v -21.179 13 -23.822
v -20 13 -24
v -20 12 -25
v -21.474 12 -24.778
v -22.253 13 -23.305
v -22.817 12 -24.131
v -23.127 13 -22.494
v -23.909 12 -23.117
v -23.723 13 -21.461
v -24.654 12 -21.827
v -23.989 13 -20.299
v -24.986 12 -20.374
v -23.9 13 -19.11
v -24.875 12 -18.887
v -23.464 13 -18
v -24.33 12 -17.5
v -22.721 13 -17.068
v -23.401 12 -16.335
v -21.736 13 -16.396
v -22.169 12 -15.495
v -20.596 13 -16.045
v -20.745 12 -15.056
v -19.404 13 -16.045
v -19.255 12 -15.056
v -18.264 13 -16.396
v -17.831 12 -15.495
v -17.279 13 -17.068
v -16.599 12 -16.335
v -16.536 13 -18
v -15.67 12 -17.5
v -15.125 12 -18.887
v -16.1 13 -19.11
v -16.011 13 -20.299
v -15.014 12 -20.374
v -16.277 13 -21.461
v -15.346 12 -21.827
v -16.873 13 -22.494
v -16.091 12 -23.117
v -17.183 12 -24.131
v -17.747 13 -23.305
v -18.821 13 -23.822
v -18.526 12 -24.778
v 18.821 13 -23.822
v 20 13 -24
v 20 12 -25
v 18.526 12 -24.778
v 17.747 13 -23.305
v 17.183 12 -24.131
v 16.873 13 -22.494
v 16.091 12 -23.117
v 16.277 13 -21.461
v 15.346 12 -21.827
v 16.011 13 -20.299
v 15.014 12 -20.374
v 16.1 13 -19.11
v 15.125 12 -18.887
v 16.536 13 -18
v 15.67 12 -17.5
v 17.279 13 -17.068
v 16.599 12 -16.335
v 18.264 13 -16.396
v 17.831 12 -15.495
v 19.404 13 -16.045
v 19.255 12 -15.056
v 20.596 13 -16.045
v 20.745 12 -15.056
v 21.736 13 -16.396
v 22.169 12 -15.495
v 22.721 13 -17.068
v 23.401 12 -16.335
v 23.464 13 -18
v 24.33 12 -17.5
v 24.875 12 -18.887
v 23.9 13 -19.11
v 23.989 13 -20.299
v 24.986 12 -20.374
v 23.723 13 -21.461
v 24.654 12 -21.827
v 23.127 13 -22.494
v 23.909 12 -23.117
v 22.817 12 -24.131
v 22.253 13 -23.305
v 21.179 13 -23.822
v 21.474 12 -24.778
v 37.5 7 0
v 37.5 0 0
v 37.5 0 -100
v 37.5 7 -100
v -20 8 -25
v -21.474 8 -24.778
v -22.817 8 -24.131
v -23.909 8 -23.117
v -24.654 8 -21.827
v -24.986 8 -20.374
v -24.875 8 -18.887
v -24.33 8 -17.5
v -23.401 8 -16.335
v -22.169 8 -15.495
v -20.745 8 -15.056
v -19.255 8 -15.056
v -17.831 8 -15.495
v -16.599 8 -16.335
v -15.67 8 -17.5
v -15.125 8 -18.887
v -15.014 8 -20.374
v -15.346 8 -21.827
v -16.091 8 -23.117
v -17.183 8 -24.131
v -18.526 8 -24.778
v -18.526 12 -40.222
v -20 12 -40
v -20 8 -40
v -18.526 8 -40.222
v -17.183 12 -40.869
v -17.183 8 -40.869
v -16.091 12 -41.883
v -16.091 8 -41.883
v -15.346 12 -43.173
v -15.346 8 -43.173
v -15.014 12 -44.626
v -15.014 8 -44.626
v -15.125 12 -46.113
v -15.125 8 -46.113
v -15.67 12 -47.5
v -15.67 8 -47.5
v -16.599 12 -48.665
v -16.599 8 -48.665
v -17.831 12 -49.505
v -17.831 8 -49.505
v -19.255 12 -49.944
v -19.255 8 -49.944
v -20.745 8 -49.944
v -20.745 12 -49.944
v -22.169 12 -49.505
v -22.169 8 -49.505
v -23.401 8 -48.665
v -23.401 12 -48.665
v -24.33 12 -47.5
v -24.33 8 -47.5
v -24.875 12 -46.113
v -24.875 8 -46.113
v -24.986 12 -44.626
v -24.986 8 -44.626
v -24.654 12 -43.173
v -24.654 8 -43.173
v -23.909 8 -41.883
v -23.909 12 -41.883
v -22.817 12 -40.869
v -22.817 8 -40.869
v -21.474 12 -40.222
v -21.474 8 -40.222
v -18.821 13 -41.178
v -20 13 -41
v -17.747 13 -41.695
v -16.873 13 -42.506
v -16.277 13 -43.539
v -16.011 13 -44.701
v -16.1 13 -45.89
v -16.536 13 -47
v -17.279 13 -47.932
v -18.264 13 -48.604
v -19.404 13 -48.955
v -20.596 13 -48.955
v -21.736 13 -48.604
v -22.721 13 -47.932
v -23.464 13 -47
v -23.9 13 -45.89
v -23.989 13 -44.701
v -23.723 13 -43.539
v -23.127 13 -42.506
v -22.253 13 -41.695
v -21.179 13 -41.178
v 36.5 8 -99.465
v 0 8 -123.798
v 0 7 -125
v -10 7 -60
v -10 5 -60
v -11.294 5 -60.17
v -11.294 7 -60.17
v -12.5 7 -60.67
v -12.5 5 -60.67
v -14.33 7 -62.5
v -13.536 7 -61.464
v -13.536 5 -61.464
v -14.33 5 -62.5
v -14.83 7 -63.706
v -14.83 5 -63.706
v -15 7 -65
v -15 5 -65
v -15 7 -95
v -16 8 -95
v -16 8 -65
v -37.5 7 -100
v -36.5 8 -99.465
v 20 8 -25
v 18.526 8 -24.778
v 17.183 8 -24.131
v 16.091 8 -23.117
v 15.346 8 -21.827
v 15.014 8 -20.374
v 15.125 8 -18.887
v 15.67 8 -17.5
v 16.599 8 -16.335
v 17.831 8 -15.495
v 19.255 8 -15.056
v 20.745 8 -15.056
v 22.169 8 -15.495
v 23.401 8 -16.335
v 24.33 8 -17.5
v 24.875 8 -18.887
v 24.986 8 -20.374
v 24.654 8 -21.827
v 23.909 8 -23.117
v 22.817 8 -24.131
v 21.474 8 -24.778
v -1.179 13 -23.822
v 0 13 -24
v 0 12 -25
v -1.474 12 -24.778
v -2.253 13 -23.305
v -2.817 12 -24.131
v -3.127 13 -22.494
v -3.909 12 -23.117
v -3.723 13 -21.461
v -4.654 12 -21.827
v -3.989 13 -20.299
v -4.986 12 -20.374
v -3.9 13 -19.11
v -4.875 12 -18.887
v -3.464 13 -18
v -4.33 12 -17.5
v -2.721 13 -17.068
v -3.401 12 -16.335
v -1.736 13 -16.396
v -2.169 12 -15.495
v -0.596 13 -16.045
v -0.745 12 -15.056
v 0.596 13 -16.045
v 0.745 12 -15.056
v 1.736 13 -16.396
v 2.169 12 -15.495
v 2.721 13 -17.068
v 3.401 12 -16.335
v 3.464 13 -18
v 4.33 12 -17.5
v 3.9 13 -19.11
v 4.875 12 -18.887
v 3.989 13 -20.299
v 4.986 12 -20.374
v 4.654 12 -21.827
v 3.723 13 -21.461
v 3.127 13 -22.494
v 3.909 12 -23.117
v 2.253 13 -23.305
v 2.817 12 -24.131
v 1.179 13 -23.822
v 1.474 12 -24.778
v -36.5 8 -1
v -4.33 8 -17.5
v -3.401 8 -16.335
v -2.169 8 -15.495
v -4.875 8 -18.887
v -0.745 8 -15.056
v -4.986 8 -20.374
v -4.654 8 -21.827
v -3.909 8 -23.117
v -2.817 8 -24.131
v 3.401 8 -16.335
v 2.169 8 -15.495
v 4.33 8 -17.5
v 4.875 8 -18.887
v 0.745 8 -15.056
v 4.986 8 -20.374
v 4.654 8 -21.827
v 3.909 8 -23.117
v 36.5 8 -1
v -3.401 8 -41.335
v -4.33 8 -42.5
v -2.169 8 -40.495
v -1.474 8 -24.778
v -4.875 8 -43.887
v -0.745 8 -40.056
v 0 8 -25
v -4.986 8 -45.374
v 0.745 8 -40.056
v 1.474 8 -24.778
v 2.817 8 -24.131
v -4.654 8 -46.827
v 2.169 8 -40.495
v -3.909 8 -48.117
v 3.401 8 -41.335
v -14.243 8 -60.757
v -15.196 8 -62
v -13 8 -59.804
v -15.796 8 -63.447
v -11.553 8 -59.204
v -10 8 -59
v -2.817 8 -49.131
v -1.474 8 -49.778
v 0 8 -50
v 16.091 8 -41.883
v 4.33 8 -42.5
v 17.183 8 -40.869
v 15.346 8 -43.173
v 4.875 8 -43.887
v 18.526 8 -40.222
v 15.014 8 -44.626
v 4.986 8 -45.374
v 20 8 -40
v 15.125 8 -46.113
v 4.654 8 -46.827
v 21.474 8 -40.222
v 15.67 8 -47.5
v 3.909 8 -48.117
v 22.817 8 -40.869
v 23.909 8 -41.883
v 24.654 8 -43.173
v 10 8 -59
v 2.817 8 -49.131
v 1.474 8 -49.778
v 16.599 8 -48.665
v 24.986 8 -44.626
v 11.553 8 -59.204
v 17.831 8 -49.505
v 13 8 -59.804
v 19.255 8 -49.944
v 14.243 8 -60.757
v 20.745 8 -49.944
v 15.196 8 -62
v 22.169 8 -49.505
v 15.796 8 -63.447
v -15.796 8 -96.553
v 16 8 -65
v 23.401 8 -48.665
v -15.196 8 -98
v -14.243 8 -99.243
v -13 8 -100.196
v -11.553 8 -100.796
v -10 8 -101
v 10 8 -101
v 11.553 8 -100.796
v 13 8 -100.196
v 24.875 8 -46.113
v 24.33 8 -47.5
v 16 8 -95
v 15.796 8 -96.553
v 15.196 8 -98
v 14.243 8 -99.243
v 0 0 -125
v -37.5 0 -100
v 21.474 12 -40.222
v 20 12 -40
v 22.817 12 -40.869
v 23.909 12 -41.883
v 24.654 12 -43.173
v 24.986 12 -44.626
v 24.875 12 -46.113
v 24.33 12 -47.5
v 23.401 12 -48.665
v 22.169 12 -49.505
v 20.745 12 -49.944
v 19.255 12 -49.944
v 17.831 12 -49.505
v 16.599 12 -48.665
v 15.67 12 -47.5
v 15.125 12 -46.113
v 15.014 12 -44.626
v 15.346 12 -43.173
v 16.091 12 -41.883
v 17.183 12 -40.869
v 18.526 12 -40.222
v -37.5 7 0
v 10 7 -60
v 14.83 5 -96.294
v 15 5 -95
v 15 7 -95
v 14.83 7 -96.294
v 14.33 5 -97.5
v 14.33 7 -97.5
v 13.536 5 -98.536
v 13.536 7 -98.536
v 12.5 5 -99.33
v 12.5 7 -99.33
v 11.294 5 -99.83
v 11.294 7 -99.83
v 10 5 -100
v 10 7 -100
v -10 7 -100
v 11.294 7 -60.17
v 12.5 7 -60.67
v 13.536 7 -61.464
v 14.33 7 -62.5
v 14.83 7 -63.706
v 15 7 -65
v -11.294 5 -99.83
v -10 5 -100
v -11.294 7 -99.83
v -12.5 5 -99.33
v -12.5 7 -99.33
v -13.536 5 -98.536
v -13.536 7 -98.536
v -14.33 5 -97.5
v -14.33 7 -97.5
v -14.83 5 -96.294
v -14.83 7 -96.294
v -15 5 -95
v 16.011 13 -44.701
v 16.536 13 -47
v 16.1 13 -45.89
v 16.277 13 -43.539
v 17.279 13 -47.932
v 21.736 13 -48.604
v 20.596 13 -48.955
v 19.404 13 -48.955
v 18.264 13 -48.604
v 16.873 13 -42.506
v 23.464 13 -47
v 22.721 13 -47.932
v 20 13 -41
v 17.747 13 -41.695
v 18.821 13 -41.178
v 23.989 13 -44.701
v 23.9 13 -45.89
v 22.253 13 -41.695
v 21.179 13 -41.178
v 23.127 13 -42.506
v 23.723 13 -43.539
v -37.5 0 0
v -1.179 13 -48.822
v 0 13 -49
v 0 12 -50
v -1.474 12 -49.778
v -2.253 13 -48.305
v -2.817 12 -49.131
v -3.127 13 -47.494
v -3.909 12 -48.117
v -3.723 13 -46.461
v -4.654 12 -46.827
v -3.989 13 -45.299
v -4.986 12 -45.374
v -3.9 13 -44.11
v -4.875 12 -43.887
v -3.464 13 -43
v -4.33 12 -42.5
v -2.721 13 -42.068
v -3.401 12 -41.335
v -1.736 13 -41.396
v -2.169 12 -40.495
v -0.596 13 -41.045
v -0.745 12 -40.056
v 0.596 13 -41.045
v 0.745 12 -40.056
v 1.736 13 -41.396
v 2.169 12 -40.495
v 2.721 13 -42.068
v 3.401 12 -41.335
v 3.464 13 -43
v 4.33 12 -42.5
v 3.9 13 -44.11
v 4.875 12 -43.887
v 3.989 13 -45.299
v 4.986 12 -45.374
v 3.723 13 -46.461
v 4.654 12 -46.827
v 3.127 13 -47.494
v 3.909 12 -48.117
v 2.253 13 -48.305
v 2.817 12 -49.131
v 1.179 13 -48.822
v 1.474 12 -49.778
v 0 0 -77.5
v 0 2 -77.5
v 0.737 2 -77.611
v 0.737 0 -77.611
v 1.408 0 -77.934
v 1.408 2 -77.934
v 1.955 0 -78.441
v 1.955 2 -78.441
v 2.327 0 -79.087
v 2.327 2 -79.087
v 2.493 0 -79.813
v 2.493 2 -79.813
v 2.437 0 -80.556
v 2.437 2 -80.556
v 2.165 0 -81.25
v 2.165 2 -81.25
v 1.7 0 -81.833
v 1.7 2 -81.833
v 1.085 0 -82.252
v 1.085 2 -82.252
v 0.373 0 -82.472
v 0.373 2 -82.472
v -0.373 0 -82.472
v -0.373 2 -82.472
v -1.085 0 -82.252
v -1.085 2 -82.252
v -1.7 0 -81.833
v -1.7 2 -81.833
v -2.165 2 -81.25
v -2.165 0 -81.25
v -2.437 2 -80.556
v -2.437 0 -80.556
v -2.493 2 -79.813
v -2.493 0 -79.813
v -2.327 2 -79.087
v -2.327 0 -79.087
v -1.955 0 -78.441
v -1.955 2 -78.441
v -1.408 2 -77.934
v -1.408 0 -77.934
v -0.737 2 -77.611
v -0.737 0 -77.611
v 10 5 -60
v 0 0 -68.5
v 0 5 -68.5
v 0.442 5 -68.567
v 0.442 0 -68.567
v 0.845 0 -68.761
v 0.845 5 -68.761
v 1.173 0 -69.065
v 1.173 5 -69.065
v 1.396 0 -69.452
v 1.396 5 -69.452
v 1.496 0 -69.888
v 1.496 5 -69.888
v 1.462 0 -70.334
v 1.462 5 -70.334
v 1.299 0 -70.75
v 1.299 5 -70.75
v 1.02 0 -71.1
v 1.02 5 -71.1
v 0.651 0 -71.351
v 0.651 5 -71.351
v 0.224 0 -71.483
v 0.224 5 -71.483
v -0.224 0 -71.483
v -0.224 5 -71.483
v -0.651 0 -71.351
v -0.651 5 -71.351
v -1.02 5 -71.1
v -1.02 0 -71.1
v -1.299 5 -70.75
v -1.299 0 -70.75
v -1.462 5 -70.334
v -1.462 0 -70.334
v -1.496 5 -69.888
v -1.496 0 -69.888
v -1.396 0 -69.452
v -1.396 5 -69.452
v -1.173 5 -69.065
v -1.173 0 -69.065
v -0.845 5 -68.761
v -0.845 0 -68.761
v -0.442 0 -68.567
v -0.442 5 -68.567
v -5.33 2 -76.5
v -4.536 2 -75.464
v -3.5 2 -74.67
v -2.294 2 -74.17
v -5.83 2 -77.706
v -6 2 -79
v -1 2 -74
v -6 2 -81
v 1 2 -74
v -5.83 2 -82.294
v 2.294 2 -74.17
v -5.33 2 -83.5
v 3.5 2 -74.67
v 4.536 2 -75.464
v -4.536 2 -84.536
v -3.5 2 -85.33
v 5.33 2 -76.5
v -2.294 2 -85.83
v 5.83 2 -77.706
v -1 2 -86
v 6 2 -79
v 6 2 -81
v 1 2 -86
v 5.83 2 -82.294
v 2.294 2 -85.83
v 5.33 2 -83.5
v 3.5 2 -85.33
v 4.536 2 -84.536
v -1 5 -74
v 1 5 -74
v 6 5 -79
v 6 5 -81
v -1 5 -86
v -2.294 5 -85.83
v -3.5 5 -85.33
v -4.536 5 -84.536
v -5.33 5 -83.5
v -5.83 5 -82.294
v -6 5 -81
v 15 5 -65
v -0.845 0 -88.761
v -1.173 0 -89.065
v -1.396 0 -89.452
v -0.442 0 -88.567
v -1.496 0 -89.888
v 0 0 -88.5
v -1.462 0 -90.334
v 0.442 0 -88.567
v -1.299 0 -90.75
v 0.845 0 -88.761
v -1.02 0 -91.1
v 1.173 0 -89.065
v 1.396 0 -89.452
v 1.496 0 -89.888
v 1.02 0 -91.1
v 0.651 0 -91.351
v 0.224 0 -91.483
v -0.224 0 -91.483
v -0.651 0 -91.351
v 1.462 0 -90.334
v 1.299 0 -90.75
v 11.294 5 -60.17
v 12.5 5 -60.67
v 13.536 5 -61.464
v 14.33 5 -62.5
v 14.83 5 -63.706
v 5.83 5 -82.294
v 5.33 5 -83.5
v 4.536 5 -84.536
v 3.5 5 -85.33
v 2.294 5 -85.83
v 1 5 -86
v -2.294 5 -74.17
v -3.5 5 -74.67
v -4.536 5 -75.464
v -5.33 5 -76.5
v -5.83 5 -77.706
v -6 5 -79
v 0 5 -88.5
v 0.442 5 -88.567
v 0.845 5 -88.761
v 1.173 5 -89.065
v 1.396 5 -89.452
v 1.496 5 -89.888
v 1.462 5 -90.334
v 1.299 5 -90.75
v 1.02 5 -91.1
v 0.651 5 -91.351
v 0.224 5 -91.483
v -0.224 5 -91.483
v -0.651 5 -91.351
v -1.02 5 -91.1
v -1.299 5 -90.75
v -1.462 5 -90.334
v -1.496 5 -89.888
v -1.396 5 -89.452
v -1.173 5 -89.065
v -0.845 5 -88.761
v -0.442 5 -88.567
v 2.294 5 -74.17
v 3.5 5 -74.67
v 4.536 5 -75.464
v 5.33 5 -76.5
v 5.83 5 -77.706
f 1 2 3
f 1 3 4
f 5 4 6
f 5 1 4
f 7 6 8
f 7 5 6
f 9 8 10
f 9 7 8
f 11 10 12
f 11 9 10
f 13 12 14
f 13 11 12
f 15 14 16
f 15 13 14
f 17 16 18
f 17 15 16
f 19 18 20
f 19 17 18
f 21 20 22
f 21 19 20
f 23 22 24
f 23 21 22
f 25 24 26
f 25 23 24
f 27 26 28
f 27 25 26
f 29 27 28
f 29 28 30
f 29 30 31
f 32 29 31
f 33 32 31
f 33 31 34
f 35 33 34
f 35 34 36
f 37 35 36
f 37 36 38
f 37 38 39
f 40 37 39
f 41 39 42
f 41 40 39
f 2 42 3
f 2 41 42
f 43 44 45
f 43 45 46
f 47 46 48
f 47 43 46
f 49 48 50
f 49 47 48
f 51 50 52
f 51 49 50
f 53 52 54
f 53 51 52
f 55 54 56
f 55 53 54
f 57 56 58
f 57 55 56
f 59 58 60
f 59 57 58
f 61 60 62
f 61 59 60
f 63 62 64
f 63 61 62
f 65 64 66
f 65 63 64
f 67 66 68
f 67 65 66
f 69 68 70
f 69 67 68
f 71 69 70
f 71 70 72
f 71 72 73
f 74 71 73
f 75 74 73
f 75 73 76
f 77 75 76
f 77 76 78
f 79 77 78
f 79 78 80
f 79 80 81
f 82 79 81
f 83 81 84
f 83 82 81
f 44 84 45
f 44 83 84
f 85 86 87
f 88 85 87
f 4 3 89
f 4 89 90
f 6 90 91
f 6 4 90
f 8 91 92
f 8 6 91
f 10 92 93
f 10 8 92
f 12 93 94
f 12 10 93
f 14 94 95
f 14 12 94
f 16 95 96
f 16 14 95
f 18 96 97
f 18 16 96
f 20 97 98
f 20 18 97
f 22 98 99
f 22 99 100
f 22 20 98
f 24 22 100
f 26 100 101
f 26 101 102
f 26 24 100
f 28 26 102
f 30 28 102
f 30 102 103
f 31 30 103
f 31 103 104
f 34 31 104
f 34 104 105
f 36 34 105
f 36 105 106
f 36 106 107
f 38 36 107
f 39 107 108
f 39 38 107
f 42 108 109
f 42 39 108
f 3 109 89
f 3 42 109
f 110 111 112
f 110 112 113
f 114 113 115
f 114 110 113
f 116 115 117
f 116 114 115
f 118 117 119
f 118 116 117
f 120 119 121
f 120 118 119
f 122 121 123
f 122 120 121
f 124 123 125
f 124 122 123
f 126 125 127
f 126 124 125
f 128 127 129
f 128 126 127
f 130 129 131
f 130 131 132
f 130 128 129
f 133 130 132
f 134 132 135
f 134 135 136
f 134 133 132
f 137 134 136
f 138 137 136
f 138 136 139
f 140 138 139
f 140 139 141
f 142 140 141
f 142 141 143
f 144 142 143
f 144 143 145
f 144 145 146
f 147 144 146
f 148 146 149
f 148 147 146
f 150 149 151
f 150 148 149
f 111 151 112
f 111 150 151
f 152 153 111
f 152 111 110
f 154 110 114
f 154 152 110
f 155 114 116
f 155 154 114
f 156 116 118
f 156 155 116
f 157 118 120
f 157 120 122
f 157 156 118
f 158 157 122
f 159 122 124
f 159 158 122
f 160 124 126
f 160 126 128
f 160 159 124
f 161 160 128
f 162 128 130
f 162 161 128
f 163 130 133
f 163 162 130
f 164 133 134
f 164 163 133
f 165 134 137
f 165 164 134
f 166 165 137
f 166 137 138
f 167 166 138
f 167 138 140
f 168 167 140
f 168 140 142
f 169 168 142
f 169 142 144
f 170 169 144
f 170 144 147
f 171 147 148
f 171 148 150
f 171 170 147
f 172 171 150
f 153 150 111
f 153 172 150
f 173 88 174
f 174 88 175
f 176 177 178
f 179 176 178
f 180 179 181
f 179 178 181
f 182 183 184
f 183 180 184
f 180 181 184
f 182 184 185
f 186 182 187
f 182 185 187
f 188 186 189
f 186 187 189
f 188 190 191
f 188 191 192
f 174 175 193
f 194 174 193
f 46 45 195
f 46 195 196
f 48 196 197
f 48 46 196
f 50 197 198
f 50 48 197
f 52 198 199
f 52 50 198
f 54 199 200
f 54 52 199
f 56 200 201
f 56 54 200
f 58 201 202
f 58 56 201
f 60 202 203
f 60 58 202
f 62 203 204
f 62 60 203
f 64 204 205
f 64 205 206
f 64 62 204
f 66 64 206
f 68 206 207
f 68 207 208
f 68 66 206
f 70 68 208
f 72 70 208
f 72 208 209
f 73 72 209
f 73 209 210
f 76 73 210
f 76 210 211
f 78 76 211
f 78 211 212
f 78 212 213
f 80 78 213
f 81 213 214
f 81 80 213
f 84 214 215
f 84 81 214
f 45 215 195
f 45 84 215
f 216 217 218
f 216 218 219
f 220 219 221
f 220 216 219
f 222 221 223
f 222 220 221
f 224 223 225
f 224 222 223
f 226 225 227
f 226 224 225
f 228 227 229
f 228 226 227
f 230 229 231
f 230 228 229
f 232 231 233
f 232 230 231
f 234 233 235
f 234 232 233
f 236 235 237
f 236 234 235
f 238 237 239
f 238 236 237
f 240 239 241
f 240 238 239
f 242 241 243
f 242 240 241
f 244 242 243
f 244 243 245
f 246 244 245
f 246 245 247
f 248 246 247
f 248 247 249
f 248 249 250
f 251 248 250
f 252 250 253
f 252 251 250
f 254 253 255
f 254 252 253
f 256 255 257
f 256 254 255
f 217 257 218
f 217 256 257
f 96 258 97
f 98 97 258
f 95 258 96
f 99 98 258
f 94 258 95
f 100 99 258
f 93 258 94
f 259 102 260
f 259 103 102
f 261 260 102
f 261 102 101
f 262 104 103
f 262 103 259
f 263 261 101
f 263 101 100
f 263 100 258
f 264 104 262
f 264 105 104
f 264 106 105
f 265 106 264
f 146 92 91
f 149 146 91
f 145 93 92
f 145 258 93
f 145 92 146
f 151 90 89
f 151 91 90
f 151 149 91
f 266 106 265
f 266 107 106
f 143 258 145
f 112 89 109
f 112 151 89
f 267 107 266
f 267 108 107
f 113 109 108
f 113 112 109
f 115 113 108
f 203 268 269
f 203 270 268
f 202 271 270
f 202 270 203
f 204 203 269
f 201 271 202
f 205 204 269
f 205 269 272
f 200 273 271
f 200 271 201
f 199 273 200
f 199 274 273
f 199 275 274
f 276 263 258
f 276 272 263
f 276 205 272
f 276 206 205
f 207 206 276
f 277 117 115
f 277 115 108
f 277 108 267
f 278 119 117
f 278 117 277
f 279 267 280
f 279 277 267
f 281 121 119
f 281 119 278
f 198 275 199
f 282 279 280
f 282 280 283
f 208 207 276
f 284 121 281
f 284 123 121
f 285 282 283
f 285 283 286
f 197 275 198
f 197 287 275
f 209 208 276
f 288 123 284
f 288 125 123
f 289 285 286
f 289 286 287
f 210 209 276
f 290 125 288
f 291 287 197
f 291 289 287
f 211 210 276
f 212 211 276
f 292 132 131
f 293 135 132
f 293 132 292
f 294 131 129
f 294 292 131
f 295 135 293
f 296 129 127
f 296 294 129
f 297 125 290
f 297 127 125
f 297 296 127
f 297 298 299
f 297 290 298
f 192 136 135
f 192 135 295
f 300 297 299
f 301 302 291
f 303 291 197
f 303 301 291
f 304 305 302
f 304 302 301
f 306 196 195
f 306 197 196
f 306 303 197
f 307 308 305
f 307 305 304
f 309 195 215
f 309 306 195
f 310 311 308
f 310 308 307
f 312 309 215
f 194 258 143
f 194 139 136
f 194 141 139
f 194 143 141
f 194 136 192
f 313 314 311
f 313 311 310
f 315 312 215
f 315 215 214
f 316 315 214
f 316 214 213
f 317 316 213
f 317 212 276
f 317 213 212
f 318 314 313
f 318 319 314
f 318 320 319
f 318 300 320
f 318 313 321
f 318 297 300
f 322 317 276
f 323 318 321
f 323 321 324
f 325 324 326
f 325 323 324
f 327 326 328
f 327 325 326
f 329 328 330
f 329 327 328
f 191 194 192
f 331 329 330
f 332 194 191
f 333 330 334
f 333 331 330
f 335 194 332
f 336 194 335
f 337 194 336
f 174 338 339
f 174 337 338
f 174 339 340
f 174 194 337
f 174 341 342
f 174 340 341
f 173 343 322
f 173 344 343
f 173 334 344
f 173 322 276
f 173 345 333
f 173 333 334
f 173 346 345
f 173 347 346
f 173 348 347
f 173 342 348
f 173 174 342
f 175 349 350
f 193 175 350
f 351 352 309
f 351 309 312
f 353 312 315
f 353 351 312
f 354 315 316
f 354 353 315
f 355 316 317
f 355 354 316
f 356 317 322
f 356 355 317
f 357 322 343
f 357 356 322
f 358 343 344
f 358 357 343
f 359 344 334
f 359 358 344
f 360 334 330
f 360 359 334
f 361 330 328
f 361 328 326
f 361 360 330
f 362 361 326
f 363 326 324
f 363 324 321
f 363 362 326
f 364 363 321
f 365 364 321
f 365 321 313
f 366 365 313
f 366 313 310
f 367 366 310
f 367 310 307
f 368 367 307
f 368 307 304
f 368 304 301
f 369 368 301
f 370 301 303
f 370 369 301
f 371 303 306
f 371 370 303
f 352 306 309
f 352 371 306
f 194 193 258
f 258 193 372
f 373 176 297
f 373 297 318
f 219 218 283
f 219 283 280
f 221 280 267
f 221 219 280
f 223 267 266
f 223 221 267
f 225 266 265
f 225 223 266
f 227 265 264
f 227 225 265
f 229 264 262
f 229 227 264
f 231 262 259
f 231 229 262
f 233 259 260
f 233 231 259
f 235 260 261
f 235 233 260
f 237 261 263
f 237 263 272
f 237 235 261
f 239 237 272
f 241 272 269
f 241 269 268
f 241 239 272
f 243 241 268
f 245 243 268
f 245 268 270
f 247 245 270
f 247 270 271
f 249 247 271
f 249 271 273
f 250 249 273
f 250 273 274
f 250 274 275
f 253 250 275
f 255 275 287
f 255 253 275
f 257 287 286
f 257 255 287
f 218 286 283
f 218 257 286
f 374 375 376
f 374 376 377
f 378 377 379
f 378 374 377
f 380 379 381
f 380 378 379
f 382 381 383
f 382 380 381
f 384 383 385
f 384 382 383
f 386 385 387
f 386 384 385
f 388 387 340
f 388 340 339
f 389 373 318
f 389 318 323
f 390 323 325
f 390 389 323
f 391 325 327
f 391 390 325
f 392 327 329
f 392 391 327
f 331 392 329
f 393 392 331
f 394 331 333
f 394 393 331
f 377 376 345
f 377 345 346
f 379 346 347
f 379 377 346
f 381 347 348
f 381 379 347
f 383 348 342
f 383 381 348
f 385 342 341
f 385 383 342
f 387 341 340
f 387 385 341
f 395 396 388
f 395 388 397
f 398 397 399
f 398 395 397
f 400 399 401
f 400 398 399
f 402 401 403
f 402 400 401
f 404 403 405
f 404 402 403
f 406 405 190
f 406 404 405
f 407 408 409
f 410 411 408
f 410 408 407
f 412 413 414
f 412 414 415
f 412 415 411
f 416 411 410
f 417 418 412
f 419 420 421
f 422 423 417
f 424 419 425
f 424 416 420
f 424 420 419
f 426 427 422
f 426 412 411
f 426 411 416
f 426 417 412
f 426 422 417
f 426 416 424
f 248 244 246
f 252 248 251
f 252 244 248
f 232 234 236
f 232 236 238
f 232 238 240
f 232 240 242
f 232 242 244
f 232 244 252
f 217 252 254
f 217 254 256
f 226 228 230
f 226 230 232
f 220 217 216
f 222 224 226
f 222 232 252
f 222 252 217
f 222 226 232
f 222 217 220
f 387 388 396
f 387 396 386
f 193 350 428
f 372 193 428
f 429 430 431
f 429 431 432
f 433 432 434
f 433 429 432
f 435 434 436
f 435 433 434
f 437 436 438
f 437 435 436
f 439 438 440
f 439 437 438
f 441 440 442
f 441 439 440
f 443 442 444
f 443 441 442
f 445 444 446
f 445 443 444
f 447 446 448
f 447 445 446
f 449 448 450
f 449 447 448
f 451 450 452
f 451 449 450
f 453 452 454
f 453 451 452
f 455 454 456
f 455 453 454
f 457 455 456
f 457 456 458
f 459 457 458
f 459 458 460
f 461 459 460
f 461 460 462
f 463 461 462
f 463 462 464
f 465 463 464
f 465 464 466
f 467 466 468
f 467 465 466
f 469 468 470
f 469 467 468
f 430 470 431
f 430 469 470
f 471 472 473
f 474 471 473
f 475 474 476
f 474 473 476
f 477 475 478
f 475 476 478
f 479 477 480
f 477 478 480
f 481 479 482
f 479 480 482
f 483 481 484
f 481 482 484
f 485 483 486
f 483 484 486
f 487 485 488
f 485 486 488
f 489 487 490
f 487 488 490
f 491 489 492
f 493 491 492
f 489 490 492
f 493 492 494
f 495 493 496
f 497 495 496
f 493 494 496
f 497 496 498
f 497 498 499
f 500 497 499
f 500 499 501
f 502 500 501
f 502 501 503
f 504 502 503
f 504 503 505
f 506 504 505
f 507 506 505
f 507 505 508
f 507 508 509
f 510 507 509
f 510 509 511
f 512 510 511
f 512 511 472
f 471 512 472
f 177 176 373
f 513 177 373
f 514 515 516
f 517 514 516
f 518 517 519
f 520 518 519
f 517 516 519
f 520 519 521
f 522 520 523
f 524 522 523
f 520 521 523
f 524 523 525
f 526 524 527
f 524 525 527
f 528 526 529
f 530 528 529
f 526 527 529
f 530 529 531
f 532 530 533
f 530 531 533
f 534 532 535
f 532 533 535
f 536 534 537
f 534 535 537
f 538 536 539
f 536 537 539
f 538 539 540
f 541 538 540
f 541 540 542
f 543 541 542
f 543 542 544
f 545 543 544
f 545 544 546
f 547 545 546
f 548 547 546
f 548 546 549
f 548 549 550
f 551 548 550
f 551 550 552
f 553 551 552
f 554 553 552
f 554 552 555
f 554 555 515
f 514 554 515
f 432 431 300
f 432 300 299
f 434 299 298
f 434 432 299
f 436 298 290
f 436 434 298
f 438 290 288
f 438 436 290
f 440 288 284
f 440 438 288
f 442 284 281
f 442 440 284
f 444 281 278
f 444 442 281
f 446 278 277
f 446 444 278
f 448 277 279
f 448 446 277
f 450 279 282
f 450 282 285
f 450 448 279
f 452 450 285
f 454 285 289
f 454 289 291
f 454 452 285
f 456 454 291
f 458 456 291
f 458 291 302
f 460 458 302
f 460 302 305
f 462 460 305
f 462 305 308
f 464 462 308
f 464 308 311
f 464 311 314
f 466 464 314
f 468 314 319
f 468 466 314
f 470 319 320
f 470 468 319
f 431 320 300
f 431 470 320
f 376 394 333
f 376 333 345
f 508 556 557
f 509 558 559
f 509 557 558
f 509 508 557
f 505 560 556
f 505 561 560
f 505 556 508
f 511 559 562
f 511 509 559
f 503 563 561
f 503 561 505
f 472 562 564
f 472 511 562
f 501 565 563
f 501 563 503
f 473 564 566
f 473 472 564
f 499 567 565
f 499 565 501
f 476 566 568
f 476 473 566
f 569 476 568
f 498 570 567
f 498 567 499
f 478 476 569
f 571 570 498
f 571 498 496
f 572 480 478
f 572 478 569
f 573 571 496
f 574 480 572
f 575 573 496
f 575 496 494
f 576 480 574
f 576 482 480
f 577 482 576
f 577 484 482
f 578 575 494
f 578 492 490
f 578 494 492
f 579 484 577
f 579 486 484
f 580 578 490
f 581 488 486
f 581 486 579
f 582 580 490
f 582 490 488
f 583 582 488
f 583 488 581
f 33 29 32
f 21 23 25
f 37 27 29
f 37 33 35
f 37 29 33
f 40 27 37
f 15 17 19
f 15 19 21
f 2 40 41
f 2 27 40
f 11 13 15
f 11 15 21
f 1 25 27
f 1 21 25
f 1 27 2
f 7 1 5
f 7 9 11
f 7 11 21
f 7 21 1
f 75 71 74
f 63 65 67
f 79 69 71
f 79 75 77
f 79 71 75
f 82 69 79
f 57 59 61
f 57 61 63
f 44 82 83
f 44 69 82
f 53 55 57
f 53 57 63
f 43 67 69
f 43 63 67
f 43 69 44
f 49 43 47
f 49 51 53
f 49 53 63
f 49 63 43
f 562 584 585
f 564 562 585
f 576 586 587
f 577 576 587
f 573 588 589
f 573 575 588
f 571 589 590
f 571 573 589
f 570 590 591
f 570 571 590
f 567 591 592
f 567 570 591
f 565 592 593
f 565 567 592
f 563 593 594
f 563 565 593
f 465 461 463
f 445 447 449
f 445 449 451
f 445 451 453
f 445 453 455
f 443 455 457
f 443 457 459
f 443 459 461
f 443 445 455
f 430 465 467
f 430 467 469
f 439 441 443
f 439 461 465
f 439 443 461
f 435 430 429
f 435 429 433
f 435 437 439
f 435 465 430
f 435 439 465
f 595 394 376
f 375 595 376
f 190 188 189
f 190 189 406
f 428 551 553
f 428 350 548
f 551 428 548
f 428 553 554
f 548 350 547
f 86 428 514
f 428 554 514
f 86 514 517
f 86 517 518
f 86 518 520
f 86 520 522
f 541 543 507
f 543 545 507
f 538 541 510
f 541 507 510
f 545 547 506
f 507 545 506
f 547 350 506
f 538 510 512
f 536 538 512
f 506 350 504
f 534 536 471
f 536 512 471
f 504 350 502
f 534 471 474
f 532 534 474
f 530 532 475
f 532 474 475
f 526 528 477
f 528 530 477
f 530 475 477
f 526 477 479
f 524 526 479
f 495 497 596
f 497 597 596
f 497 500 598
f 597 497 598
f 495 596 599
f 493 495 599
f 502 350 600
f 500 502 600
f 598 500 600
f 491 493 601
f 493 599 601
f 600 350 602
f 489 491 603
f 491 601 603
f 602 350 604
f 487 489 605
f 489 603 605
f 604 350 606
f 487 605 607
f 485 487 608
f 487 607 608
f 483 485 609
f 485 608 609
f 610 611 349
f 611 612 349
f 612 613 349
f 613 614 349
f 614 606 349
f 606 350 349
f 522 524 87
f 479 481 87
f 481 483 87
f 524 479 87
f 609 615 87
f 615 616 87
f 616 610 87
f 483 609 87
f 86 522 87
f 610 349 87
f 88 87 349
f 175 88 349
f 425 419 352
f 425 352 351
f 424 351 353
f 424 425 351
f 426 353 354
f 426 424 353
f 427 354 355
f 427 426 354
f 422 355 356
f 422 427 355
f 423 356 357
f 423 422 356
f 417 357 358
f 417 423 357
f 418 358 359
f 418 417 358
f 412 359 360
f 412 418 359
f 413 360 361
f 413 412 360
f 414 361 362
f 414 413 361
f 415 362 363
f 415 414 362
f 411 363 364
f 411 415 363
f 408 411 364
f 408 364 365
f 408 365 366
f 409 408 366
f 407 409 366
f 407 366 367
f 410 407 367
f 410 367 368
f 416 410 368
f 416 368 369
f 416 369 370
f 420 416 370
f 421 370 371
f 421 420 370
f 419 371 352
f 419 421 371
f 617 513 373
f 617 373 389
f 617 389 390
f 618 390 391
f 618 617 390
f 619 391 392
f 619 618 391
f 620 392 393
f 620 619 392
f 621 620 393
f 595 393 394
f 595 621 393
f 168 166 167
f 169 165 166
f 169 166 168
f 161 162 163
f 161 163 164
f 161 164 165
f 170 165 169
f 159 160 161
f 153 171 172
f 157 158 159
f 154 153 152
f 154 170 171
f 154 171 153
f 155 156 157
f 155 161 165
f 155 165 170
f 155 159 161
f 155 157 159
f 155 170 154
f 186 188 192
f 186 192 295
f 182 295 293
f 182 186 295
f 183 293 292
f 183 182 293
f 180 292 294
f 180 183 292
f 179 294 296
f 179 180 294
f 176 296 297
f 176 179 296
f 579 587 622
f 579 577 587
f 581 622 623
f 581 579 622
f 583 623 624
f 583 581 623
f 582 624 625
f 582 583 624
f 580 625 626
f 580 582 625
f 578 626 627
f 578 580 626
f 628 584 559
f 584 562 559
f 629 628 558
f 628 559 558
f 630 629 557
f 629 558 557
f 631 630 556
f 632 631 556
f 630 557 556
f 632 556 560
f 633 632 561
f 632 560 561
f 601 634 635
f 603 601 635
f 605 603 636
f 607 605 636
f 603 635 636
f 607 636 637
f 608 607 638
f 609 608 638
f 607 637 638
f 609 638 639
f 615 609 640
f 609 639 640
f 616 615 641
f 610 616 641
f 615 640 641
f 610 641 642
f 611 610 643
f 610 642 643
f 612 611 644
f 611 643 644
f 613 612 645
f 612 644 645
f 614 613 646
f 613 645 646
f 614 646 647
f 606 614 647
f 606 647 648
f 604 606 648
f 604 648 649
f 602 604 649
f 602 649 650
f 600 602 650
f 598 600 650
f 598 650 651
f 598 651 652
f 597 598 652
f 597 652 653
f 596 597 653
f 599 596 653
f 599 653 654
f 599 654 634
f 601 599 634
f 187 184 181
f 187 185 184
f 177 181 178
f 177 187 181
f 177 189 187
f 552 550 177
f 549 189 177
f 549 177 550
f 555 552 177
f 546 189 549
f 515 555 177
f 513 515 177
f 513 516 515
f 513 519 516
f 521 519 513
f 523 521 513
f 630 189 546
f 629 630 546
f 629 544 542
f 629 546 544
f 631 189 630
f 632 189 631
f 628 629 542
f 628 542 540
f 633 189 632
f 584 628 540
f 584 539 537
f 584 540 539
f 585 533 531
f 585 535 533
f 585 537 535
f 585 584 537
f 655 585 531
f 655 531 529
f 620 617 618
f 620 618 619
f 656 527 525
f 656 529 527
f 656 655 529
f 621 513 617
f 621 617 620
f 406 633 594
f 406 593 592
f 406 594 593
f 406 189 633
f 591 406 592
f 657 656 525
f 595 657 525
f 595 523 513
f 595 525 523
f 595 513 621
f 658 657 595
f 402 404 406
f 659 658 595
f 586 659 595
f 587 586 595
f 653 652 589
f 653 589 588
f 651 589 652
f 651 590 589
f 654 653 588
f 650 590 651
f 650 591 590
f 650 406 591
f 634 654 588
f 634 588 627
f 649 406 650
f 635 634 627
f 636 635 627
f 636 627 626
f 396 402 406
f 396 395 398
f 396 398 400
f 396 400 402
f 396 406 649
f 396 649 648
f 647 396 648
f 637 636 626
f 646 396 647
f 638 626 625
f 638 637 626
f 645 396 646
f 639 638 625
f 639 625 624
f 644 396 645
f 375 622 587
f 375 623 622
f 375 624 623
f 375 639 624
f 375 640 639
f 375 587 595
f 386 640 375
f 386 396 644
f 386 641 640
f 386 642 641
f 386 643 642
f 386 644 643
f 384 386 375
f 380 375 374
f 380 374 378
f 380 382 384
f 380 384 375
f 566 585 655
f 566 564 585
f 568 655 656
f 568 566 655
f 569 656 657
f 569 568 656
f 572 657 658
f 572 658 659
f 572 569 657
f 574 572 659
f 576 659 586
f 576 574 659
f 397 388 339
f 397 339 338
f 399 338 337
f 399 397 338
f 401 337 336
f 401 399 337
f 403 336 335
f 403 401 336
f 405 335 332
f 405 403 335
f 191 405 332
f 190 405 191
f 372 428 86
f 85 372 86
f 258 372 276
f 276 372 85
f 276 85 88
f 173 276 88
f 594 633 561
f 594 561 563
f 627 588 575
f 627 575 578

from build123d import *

# Parameters (mm, degrees)
BOSS_EXTRUDE1_DEPTH       = 8
SKETCH2_W                 = 5
SKETCH2_H                 = 5
LPATTERN1_COUNT           = 2
LPATTERN1_PITCH           = 20
LPATTERN1_COL_COUNT       = 2
LPATTERN1_COL_PITCH       = 20
LPATTERN2_COUNT           = 2
LPATTERN2_PITCH           = 25
LPATTERN2_COPY_1_SKETCH_W = 5
LPATTERN2_COPY_1_SKETCH_H = 5
LPATTERN2_COPY_2_SKETCH_W = 5
LPATTERN2_COPY_2_SKETCH_H = 5
SKETCH3_W                 = 30
SKETCH3_H                 = 40
CUT_EXTRUDE1_DEPTH        = 3
FILLET1_R                 = 5
CHAMFER1_SIZE             = 1
SKETCH4_R                 = 1.5
SKETCH4_R_2               = 2.5
CUT_EXTRUDE2_DEPTH        = 131.748804966
SKETCH5_W                 = 12
SKETCH5_H                 = 12
CUT_EXTRUDE3_DEPTH        = 3
FILLET2_R                 = 5


with BuildPart() as part:
    # Sketch1 → Boss-Extrude1 (new body)
    with BuildSketch(Plane(origin=(0, 0, 0), x_dir=(1, 0, 0), z_dir=(0, 1, 0))):
        Polygon((-37.5, 0), (37.5, 0), (37.5, 100), (0, 125), (-37.5, 100), align=None)
    extrude(amount=BOSS_EXTRUDE1_DEPTH)

    # Sketch2 → Revolve1 (revolve)
    with BuildSketch(Plane(origin=(0, 0, 0), x_dir=(0, 0, -1), z_dir=(1, 0, 0)), mode=Mode.PRIVATE) as revolve1_sk:
        with Locations((17.5, 10.5)):
            Rectangle(SKETCH2_W, SKETCH2_H)
    revolve1 = revolve(revolve1_sk.sketch.rotate(Axis((0, 8, -20), (0, 1, 0)), 180), axis=Axis((0, 8, -20), (0, 1, 0)))

    # LPattern1: Revolve1 ×2
    with Locations(*[(-i * LPATTERN1_PITCH, 0, 0) for i in range(1, LPATTERN1_COUNT)]):
        add(revolve1)

    # LPattern1 col: Revolve1 ×2
    with Locations(*[(i * LPATTERN1_COL_PITCH, 0, 0) for i in range(1, LPATTERN1_COL_COUNT)]):
        add(revolve1)

    # LPattern2: Revolve1 ×2
    with Locations(*[(0, 0, -i * LPATTERN2_PITCH) for i in range(1, LPATTERN2_COUNT)]):
        add(revolve1)

    # LPattern2 copy 1 sketch → LPattern2 copy 1 (revolve)
    with BuildSketch(Plane(origin=(-20, 0, -25), x_dir=(0, 0, -1), z_dir=(1, 0, 0))):
        with Locations((17.5, 10.5)):
            Rectangle(LPATTERN2_COPY_1_SKETCH_W, LPATTERN2_COPY_1_SKETCH_H)
    revolve(axis=Axis((-20, 8, -45), (0, 1, 0)))

    # LPattern2 copy 2 sketch → LPattern2 copy 2 (revolve)
    with BuildSketch(Plane(origin=(20, 0, -25), x_dir=(0, 0, -1), z_dir=(1, 0, 0))):
        with Locations((17.5, 10.5)):
            Rectangle(LPATTERN2_COPY_2_SKETCH_W, LPATTERN2_COPY_2_SKETCH_H)
    revolve(axis=Axis((20, 8, -45), (0, 1, 0)))

    # Sketch3 → Cut-Extrude1 (cut)
    with BuildSketch(Plane(origin=(0, 8, 0), x_dir=(1, 0, 0), z_dir=(0, 1, 0))):
        with Locations((0, 80)):
            Rectangle(SKETCH3_W, SKETCH3_H)
    extrude(amount=-CUT_EXTRUDE1_DEPTH, mode=Mode.SUBTRACT)

    # Fillet1
    fillet1_edges = [part.edges().sort_by_distance(p)[0] for p in [
        (-15, 6.5, -60),
        (-15, 6.5, -100),
        (15, 6.5, -100),
        (15, 6.5, -60),
    ]]
    fillet(fillet1_edges, radius=FILLET1_R)

    # Chamfer1
    chamfer1_edges = [part.edges().sort_by_distance(p)[0] for p in [
        (18.75, 8, -112.5),
        (-18.75, 8, -112.5),
        (0, 13, -15),
        (20, 13, -15),
        (-37.5, 8, -50),
        (-20, 13, -15),
        (0, 8, 0),
        (0, 13, -40),
        (20, 13, -50),
        (-20, 13, -50),
        (37.5, 8, -50),
        (15, 8, -80),
        (0, 8, -60),
        (0, 8, -100),
        (-15, 8, -80),
        (13.535533906, 8, -61.464466094),
        (13.535533906, 8, -98.535533906),
        (-13.535533906, 8, -61.464466094),
        (-13.535533906, 8, -98.535533906),
    ]]
    chamfer(chamfer1_edges, length=CHAMFER1_SIZE)

    # Sketch4 → Cut-Extrude2 (cut, through all)
    with BuildSketch(Plane(origin=(0, 5, 0), x_dir=(1, 0, 0), z_dir=(0, 1, 0))):
        with Locations(Location((0, 90, 0), (0, 0, 270))):
            Circle(SKETCH4_R)
        with Locations(Location((0, 80, 0), (0, 0, 270))):
            Circle(SKETCH4_R_2)
        with Locations(Location((0, 70, 0), (0, 0, 270))):
            Circle(SKETCH4_R)
    extrude(amount=-CUT_EXTRUDE2_DEPTH, mode=Mode.SUBTRACT)

    # Sketch5 → Cut-Extrude3 (cut)
    with BuildSketch(Plane(origin=(0, 5, 0), x_dir=(1, 0, 0), z_dir=(0, 1, 0))):
        with Locations((0, 80)):
            Rectangle(SKETCH5_W, SKETCH5_H)
    extrude(amount=-CUT_EXTRUDE3_DEPTH, mode=Mode.SUBTRACT)

    # Fillet2
    fillet2_edges = [part.edges().sort_by_distance(p)[0] for p in [
        (-6, 3.5, -74),
        (-6, 3.5, -86),
        (6, 3.5, -86),
        (6, 3.5, -74),
    ]]
    fillet(fillet2_edges, radius=FILLET2_R)


solid = part.part
